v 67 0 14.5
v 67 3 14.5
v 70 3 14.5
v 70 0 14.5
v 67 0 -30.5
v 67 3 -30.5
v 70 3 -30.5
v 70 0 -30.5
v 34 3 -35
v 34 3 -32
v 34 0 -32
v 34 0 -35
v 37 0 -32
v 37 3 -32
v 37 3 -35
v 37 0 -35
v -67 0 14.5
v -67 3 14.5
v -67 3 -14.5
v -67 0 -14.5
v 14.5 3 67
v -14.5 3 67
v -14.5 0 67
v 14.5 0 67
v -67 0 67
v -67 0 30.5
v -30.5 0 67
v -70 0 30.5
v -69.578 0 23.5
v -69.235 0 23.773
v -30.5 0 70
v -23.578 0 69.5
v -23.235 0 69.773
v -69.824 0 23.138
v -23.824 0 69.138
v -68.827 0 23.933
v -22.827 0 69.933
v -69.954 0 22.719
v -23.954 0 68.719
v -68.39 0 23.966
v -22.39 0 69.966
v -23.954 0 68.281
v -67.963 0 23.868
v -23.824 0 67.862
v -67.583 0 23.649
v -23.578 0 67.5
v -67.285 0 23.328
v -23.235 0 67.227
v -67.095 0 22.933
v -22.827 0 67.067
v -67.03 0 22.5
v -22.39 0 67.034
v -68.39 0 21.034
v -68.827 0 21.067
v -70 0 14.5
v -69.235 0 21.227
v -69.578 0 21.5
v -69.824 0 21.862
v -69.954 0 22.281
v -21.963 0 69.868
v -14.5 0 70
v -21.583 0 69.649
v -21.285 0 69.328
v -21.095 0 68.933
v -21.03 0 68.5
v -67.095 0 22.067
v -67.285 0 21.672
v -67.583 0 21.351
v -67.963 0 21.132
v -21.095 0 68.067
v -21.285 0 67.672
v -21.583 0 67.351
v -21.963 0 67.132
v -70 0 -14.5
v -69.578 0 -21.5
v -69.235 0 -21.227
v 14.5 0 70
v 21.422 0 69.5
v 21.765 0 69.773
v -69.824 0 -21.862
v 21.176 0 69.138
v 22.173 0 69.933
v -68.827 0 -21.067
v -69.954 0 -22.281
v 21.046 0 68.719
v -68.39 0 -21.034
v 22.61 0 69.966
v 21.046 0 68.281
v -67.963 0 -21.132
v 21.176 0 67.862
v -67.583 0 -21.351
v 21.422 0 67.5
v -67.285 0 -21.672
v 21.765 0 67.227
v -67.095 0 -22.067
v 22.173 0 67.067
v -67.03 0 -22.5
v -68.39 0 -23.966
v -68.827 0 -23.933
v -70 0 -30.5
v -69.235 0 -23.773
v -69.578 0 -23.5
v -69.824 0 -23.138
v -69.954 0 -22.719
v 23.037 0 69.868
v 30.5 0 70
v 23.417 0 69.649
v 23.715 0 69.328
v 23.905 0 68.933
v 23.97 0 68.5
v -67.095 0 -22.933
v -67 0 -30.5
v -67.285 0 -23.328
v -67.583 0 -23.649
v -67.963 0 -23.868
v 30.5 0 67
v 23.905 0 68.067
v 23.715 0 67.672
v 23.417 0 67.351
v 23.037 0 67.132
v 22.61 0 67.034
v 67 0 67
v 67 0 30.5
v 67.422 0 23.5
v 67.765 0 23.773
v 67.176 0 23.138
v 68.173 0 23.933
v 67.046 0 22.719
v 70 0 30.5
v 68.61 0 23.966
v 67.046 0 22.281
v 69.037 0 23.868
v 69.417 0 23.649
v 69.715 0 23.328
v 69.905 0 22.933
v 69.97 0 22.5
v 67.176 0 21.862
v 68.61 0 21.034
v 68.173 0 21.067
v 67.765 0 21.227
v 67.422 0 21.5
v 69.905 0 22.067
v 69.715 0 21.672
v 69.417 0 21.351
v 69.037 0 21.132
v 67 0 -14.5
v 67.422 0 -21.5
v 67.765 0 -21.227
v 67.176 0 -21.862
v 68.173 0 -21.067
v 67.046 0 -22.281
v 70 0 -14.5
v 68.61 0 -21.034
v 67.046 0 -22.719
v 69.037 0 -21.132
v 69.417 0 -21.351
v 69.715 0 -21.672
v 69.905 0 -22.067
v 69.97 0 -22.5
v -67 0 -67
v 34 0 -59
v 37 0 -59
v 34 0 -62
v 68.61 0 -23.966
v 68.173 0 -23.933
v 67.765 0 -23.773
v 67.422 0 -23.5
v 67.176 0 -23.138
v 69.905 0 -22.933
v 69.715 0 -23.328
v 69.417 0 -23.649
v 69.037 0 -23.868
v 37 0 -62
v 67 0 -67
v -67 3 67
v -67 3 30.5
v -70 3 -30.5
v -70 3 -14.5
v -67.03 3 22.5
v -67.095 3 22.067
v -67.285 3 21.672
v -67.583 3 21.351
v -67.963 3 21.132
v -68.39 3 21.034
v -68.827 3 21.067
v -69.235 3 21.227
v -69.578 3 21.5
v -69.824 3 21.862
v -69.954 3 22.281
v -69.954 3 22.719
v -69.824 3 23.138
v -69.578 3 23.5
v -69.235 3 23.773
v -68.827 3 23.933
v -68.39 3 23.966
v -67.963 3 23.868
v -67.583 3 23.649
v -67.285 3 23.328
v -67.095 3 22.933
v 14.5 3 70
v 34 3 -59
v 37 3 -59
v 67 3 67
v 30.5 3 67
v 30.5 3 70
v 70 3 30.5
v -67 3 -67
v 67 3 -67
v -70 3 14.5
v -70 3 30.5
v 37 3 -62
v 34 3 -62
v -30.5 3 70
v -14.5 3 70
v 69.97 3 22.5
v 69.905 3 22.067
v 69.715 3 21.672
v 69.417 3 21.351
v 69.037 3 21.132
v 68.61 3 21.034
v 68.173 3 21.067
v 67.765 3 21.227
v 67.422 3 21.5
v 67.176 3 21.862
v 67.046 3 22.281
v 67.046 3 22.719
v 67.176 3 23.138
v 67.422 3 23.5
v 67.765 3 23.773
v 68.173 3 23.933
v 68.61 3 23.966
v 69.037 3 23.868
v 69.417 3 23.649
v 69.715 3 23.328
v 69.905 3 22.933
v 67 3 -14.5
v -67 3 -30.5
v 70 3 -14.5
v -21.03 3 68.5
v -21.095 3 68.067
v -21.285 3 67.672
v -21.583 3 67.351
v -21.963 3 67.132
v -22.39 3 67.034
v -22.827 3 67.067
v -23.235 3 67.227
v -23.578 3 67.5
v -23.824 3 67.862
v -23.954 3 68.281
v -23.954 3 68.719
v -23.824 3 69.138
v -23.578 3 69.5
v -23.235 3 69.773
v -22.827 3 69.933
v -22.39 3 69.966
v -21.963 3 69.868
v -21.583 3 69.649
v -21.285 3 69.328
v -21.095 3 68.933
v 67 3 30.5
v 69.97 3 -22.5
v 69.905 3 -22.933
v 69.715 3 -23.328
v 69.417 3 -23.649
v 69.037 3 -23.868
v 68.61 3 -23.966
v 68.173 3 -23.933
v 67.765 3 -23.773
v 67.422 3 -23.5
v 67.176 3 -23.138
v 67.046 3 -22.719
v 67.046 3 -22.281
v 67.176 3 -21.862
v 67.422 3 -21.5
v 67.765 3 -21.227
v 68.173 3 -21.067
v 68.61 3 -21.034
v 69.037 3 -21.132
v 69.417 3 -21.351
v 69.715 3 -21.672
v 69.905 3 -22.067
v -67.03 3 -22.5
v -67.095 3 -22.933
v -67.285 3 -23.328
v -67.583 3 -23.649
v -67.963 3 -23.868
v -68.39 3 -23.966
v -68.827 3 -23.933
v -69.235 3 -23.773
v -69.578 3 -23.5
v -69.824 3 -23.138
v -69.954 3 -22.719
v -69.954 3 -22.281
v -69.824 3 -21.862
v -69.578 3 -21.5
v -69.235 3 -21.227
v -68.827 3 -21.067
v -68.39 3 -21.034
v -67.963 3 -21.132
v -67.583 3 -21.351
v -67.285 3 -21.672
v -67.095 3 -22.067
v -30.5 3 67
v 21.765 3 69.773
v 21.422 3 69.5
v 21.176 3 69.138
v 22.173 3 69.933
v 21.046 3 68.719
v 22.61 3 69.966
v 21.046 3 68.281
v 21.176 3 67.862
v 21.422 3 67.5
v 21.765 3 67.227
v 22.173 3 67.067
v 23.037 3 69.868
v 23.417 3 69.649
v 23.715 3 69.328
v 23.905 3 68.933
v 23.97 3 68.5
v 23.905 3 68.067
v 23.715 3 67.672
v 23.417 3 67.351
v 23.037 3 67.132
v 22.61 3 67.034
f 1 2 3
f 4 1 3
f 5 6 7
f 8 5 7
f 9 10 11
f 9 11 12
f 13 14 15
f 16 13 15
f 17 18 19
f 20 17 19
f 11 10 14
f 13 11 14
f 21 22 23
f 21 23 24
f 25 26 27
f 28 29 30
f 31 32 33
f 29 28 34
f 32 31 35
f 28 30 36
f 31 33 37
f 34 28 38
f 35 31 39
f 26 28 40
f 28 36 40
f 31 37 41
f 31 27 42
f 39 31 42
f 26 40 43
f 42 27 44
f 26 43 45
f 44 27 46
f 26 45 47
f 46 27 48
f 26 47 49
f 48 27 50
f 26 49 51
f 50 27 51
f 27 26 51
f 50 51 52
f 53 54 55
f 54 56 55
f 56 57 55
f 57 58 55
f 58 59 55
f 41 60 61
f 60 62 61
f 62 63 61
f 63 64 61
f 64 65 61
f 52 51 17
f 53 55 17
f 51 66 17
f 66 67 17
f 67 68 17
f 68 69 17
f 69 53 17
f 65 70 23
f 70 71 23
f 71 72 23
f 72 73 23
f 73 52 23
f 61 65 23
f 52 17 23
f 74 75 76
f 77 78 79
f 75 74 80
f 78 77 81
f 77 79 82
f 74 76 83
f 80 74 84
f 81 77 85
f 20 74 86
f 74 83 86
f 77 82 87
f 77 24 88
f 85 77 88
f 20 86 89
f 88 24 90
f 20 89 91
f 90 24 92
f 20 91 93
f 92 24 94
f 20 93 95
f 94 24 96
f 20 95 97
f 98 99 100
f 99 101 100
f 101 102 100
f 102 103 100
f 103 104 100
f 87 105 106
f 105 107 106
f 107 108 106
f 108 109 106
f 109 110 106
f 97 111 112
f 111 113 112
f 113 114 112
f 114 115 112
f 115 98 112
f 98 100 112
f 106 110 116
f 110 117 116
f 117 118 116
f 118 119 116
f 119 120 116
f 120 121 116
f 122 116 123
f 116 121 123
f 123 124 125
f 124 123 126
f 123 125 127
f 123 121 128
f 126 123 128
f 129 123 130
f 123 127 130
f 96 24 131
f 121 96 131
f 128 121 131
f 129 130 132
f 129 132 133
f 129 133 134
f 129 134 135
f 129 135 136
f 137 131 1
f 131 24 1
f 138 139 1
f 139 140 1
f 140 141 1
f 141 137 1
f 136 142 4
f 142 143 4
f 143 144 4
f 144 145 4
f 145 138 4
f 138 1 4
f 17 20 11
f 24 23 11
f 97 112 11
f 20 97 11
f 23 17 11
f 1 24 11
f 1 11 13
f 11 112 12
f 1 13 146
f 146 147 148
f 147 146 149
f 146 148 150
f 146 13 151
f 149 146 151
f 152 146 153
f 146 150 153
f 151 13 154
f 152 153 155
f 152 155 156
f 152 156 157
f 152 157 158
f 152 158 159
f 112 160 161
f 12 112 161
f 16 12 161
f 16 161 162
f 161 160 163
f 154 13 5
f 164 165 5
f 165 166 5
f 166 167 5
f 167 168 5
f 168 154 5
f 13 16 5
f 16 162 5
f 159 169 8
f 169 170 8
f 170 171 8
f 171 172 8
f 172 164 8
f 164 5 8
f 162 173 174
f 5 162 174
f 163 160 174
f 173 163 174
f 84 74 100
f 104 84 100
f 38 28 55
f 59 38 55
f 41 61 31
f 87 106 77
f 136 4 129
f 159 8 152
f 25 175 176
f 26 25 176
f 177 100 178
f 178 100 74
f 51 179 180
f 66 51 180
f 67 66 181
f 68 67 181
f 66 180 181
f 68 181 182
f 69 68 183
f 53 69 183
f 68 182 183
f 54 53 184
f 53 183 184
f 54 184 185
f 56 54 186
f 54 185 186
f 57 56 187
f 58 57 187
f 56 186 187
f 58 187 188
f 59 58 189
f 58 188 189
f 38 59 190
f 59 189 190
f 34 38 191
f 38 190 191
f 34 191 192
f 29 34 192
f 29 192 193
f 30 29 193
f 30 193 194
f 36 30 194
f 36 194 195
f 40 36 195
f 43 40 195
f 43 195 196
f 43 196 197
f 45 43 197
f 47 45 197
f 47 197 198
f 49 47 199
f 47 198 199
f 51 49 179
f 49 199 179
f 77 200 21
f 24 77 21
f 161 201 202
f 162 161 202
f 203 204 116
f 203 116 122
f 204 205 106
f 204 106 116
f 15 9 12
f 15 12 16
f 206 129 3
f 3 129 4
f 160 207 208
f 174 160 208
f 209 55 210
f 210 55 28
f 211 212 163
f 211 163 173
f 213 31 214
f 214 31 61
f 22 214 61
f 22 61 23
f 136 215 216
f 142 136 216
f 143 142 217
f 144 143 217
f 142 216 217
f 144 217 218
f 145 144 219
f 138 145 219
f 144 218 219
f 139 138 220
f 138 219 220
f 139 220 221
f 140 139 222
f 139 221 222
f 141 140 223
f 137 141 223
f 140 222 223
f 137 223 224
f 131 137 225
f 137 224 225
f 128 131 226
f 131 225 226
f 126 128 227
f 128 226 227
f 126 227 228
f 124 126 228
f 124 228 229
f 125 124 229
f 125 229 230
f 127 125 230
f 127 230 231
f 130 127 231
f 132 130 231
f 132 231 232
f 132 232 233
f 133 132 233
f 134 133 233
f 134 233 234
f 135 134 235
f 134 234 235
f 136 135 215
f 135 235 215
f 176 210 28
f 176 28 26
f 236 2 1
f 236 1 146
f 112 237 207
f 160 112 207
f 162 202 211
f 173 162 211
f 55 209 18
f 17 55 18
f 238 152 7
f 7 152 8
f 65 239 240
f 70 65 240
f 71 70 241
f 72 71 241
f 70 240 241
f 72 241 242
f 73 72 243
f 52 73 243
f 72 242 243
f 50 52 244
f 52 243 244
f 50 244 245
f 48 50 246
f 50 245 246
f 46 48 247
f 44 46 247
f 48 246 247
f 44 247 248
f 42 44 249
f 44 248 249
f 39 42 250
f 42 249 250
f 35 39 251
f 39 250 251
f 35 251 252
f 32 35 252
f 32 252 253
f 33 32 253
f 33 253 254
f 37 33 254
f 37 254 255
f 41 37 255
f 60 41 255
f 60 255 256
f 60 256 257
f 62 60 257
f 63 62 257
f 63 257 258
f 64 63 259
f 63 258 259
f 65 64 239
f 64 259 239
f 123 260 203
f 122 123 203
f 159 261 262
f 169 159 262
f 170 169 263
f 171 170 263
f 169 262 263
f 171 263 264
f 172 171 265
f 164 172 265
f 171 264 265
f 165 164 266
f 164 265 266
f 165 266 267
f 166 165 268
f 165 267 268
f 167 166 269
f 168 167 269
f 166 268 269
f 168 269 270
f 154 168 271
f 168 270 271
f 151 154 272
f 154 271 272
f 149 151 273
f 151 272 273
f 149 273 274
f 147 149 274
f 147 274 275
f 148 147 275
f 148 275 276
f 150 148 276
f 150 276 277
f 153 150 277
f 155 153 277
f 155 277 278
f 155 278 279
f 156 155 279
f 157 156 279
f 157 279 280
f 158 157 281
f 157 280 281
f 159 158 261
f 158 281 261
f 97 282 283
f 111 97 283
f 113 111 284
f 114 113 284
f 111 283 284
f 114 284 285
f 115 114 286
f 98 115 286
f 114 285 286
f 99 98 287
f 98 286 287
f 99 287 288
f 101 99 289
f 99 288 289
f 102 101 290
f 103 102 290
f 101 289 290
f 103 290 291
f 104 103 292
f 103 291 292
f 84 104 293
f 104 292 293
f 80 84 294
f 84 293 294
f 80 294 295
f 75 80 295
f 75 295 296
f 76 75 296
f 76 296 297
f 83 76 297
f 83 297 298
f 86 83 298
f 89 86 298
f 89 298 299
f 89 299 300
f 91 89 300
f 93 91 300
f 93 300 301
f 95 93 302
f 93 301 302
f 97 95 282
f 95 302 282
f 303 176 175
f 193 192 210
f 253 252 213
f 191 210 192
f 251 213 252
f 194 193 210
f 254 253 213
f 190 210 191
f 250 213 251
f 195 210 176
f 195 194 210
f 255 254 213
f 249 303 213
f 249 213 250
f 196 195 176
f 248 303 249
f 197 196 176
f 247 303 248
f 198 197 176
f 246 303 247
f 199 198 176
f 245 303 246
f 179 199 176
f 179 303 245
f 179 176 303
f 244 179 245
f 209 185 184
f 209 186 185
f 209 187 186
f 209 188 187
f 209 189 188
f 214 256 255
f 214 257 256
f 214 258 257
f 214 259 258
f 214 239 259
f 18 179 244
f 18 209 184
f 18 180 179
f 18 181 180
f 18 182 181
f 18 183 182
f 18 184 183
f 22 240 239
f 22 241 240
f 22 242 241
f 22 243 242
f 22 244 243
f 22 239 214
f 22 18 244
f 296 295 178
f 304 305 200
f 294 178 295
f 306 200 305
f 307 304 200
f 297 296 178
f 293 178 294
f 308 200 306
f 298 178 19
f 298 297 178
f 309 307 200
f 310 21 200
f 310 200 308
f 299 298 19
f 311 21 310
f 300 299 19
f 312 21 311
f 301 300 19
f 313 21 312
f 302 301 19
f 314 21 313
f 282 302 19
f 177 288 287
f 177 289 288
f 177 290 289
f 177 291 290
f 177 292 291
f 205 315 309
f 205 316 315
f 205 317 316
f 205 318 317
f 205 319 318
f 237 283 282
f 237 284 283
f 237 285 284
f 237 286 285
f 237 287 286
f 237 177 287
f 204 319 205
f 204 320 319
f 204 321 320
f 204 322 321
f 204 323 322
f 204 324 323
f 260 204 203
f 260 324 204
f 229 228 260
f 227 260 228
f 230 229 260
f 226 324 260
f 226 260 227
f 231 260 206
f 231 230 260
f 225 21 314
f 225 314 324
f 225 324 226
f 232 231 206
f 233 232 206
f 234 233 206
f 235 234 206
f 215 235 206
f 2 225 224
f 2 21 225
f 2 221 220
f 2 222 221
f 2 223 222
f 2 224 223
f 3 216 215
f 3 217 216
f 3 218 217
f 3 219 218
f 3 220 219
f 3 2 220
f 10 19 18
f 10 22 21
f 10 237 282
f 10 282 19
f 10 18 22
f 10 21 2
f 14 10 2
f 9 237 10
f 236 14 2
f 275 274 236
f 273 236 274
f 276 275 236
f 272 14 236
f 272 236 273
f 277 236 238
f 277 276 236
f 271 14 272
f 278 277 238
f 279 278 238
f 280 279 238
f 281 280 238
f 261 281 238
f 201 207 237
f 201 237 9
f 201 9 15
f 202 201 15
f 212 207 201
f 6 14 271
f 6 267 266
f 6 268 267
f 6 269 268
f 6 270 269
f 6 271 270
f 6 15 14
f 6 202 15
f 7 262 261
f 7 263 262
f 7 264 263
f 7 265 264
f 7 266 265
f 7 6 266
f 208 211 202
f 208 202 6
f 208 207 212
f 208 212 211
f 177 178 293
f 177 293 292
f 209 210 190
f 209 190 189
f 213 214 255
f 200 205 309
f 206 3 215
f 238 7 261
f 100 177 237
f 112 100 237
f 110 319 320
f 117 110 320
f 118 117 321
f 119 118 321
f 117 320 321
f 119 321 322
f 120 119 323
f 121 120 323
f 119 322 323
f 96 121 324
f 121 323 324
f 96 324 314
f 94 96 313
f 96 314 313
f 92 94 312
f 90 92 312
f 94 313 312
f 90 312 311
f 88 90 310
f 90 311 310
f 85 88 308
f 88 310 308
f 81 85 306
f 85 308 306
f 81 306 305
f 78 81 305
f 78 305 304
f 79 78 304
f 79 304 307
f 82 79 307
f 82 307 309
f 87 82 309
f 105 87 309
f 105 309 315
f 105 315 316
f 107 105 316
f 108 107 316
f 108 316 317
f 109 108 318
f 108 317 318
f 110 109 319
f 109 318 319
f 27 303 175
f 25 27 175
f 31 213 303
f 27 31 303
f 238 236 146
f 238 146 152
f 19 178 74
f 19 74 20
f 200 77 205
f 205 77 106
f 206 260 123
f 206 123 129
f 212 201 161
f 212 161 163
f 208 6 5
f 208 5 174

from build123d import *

# Parameters (mm, degrees)
BOSS_EXTRUDE1_DEPTH = 3
SKETCH2_W           = 3
SKETCH2_H           = 3
SKETCH2_H_2         = 36.5
SKETCH2_W_2         = 36.5
SKETCH2_W_3         = 29
SKETCH2_H_3         = 29
CUT_EXTRUDE2_DEPTH  = 3
SKETCH3_R           = 1.47
CUT_EXTRUDE3_DEPTH  = 3
SKETCH4_W           = 16
SKETCH4_H           = 3
CUT_EXTRUDE6_DEPTH  = 3
SKETCH6_W           = 16
SKETCH6_H           = 3
CUT_EXTRUDE7_DEPTH  = 3
SKETCH7_W           = 3
SKETCH7_H           = 3
CUT_EXTRUDE8_DEPTH  = 3


with BuildPart() as part:
    # Sketch1 → Boss-Extrude1 (new body)
    with BuildSketch(Plane(origin=(0, 0, 0), x_dir=(1, 0, 0), z_dir=(0, 1, 0))):
        Polygon((70, 70), (-70, 70), (0, 0), align=None)
        Polygon((0, 0), (-70, 70), (-70, -70), align=None)
        Polygon((70, -70), (0, 0), (-70, -70), align=None)
        Polygon((70, 70), (0, 0), (70, -70), align=None)
    extrude(amount=BOSS_EXTRUDE1_DEPTH)

    # Sketch2 → Cut-Extrude2 (cut)
    with BuildSketch(Plane(origin=(0, 3, 0), x_dir=(1, 0, 0), z_dir=(0, 1, 0))):
        with Locations((-68.5, 68.5)):
            Rectangle(SKETCH2_W, SKETCH2_H)
        with Locations((-68.5, 48.75)):
            Rectangle(SKETCH2_W, SKETCH2_H_2)
        with Locations((-48.75, 68.5)):
            Rectangle(SKETCH2_W_2, SKETCH2_H)
        with Locations((48.75, 68.5)):
            Rectangle(SKETCH2_W_2, SKETCH2_H)
        with Locations((68.5, 68.5)):
            Rectangle(SKETCH2_W, SKETCH2_H)
        with Locations((68.5, 48.75)):
            Rectangle(SKETCH2_W, SKETCH2_H_2)
        with Locations((68.5, -68.5)):
            Rectangle(SKETCH2_W, SKETCH2_H)
        with Locations((68.5, -48.75)):
            Rectangle(SKETCH2_W, SKETCH2_H_2)
        with Locations((48.75, -68.5)):
            Rectangle(SKETCH2_W_2, SKETCH2_H)
        with Locations((-48.75, -68.5)):
            Rectangle(SKETCH2_W_2, SKETCH2_H)
        with Locations((-68.5, -68.5)):
            Rectangle(SKETCH2_W, SKETCH2_H)
        with Locations((-68.5, -48.75)):
            Rectangle(SKETCH2_W, SKETCH2_H_2)
        with Locations((0, 68.5)):
            Rectangle(SKETCH2_W_3, SKETCH2_H)
        with Locations((0, -68.5)):
            Rectangle(SKETCH2_W_3, SKETCH2_H)
        with Locations((68.5, 0)):
            Rectangle(SKETCH2_W, SKETCH2_H_3)
        with Locations((-68.5, 0)):
            Rectangle(SKETCH2_W, SKETCH2_H_3)
    extrude(amount=-CUT_EXTRUDE2_DEPTH, mode=Mode.SUBTRACT)

    # Sketch3 → Cut-Extrude3 (cut)
    with BuildSketch(Plane(origin=(0, 3, 0), x_dir=(1, 0, 0), z_dir=(0, 1, 0))):
        with Locations((22.5, -68.5)):
            Circle(SKETCH3_R)
        with Locations((-22.5, -68.5)):
            Circle(SKETCH3_R)
        with Locations((-22.5, 68.5)):
            Circle(SKETCH3_R)
        with Locations((22.5, 68.5)):
            Circle(SKETCH3_R)
        with Locations((68.5, -22.5)):
            Circle(SKETCH3_R)
        with Locations((-68.5, -22.5)):
            Circle(SKETCH3_R)
        with Locations((-68.5, 22.5)):
            Circle(SKETCH3_R)
        with Locations((68.5, 22.5)):
            Circle(SKETCH3_R)
    extrude(amount=-CUT_EXTRUDE3_DEPTH, mode=Mode.SUBTRACT)

    # Sketch4 → Cut-Extrude6 (cut)
    with BuildSketch(Plane(origin=(0, 3, 0), x_dir=(1, 0, 0), z_dir=(0, 1, 0))):
        with Locations((22.5, 68.5)):
            Rectangle(SKETCH4_W, SKETCH4_H)
    extrude(amount=-CUT_EXTRUDE6_DEPTH, mode=Mode.SUBTRACT)

    # Sketch6 → Cut-Extrude7 (cut)
    with BuildSketch(Plane(origin=(0, 3, 0), x_dir=(1, 0, 0), z_dir=(0, 1, 0))):
        with Locations((-22.5, 68.5)):
            Rectangle(SKETCH6_W, SKETCH6_H)
    extrude(amount=-CUT_EXTRUDE7_DEPTH, mode=Mode.SUBTRACT)

    # Sketch7 → Cut-Extrude8 (cut)
    with BuildSketch(Plane(origin=(0, 3, 0), x_dir=(1, 0, 0), z_dir=(0, 1, 0))):
        with Locations((35.5, 33.5)):
            Rectangle(SKETCH7_W, SKETCH7_H)
        with Locations((35.5, 60.5)):
            Rectangle(SKETCH7_W, SKETCH7_H)
    extrude(amount=-CUT_EXTRUDE8_DEPTH, mode=Mode.SUBTRACT)


solid = part.part
